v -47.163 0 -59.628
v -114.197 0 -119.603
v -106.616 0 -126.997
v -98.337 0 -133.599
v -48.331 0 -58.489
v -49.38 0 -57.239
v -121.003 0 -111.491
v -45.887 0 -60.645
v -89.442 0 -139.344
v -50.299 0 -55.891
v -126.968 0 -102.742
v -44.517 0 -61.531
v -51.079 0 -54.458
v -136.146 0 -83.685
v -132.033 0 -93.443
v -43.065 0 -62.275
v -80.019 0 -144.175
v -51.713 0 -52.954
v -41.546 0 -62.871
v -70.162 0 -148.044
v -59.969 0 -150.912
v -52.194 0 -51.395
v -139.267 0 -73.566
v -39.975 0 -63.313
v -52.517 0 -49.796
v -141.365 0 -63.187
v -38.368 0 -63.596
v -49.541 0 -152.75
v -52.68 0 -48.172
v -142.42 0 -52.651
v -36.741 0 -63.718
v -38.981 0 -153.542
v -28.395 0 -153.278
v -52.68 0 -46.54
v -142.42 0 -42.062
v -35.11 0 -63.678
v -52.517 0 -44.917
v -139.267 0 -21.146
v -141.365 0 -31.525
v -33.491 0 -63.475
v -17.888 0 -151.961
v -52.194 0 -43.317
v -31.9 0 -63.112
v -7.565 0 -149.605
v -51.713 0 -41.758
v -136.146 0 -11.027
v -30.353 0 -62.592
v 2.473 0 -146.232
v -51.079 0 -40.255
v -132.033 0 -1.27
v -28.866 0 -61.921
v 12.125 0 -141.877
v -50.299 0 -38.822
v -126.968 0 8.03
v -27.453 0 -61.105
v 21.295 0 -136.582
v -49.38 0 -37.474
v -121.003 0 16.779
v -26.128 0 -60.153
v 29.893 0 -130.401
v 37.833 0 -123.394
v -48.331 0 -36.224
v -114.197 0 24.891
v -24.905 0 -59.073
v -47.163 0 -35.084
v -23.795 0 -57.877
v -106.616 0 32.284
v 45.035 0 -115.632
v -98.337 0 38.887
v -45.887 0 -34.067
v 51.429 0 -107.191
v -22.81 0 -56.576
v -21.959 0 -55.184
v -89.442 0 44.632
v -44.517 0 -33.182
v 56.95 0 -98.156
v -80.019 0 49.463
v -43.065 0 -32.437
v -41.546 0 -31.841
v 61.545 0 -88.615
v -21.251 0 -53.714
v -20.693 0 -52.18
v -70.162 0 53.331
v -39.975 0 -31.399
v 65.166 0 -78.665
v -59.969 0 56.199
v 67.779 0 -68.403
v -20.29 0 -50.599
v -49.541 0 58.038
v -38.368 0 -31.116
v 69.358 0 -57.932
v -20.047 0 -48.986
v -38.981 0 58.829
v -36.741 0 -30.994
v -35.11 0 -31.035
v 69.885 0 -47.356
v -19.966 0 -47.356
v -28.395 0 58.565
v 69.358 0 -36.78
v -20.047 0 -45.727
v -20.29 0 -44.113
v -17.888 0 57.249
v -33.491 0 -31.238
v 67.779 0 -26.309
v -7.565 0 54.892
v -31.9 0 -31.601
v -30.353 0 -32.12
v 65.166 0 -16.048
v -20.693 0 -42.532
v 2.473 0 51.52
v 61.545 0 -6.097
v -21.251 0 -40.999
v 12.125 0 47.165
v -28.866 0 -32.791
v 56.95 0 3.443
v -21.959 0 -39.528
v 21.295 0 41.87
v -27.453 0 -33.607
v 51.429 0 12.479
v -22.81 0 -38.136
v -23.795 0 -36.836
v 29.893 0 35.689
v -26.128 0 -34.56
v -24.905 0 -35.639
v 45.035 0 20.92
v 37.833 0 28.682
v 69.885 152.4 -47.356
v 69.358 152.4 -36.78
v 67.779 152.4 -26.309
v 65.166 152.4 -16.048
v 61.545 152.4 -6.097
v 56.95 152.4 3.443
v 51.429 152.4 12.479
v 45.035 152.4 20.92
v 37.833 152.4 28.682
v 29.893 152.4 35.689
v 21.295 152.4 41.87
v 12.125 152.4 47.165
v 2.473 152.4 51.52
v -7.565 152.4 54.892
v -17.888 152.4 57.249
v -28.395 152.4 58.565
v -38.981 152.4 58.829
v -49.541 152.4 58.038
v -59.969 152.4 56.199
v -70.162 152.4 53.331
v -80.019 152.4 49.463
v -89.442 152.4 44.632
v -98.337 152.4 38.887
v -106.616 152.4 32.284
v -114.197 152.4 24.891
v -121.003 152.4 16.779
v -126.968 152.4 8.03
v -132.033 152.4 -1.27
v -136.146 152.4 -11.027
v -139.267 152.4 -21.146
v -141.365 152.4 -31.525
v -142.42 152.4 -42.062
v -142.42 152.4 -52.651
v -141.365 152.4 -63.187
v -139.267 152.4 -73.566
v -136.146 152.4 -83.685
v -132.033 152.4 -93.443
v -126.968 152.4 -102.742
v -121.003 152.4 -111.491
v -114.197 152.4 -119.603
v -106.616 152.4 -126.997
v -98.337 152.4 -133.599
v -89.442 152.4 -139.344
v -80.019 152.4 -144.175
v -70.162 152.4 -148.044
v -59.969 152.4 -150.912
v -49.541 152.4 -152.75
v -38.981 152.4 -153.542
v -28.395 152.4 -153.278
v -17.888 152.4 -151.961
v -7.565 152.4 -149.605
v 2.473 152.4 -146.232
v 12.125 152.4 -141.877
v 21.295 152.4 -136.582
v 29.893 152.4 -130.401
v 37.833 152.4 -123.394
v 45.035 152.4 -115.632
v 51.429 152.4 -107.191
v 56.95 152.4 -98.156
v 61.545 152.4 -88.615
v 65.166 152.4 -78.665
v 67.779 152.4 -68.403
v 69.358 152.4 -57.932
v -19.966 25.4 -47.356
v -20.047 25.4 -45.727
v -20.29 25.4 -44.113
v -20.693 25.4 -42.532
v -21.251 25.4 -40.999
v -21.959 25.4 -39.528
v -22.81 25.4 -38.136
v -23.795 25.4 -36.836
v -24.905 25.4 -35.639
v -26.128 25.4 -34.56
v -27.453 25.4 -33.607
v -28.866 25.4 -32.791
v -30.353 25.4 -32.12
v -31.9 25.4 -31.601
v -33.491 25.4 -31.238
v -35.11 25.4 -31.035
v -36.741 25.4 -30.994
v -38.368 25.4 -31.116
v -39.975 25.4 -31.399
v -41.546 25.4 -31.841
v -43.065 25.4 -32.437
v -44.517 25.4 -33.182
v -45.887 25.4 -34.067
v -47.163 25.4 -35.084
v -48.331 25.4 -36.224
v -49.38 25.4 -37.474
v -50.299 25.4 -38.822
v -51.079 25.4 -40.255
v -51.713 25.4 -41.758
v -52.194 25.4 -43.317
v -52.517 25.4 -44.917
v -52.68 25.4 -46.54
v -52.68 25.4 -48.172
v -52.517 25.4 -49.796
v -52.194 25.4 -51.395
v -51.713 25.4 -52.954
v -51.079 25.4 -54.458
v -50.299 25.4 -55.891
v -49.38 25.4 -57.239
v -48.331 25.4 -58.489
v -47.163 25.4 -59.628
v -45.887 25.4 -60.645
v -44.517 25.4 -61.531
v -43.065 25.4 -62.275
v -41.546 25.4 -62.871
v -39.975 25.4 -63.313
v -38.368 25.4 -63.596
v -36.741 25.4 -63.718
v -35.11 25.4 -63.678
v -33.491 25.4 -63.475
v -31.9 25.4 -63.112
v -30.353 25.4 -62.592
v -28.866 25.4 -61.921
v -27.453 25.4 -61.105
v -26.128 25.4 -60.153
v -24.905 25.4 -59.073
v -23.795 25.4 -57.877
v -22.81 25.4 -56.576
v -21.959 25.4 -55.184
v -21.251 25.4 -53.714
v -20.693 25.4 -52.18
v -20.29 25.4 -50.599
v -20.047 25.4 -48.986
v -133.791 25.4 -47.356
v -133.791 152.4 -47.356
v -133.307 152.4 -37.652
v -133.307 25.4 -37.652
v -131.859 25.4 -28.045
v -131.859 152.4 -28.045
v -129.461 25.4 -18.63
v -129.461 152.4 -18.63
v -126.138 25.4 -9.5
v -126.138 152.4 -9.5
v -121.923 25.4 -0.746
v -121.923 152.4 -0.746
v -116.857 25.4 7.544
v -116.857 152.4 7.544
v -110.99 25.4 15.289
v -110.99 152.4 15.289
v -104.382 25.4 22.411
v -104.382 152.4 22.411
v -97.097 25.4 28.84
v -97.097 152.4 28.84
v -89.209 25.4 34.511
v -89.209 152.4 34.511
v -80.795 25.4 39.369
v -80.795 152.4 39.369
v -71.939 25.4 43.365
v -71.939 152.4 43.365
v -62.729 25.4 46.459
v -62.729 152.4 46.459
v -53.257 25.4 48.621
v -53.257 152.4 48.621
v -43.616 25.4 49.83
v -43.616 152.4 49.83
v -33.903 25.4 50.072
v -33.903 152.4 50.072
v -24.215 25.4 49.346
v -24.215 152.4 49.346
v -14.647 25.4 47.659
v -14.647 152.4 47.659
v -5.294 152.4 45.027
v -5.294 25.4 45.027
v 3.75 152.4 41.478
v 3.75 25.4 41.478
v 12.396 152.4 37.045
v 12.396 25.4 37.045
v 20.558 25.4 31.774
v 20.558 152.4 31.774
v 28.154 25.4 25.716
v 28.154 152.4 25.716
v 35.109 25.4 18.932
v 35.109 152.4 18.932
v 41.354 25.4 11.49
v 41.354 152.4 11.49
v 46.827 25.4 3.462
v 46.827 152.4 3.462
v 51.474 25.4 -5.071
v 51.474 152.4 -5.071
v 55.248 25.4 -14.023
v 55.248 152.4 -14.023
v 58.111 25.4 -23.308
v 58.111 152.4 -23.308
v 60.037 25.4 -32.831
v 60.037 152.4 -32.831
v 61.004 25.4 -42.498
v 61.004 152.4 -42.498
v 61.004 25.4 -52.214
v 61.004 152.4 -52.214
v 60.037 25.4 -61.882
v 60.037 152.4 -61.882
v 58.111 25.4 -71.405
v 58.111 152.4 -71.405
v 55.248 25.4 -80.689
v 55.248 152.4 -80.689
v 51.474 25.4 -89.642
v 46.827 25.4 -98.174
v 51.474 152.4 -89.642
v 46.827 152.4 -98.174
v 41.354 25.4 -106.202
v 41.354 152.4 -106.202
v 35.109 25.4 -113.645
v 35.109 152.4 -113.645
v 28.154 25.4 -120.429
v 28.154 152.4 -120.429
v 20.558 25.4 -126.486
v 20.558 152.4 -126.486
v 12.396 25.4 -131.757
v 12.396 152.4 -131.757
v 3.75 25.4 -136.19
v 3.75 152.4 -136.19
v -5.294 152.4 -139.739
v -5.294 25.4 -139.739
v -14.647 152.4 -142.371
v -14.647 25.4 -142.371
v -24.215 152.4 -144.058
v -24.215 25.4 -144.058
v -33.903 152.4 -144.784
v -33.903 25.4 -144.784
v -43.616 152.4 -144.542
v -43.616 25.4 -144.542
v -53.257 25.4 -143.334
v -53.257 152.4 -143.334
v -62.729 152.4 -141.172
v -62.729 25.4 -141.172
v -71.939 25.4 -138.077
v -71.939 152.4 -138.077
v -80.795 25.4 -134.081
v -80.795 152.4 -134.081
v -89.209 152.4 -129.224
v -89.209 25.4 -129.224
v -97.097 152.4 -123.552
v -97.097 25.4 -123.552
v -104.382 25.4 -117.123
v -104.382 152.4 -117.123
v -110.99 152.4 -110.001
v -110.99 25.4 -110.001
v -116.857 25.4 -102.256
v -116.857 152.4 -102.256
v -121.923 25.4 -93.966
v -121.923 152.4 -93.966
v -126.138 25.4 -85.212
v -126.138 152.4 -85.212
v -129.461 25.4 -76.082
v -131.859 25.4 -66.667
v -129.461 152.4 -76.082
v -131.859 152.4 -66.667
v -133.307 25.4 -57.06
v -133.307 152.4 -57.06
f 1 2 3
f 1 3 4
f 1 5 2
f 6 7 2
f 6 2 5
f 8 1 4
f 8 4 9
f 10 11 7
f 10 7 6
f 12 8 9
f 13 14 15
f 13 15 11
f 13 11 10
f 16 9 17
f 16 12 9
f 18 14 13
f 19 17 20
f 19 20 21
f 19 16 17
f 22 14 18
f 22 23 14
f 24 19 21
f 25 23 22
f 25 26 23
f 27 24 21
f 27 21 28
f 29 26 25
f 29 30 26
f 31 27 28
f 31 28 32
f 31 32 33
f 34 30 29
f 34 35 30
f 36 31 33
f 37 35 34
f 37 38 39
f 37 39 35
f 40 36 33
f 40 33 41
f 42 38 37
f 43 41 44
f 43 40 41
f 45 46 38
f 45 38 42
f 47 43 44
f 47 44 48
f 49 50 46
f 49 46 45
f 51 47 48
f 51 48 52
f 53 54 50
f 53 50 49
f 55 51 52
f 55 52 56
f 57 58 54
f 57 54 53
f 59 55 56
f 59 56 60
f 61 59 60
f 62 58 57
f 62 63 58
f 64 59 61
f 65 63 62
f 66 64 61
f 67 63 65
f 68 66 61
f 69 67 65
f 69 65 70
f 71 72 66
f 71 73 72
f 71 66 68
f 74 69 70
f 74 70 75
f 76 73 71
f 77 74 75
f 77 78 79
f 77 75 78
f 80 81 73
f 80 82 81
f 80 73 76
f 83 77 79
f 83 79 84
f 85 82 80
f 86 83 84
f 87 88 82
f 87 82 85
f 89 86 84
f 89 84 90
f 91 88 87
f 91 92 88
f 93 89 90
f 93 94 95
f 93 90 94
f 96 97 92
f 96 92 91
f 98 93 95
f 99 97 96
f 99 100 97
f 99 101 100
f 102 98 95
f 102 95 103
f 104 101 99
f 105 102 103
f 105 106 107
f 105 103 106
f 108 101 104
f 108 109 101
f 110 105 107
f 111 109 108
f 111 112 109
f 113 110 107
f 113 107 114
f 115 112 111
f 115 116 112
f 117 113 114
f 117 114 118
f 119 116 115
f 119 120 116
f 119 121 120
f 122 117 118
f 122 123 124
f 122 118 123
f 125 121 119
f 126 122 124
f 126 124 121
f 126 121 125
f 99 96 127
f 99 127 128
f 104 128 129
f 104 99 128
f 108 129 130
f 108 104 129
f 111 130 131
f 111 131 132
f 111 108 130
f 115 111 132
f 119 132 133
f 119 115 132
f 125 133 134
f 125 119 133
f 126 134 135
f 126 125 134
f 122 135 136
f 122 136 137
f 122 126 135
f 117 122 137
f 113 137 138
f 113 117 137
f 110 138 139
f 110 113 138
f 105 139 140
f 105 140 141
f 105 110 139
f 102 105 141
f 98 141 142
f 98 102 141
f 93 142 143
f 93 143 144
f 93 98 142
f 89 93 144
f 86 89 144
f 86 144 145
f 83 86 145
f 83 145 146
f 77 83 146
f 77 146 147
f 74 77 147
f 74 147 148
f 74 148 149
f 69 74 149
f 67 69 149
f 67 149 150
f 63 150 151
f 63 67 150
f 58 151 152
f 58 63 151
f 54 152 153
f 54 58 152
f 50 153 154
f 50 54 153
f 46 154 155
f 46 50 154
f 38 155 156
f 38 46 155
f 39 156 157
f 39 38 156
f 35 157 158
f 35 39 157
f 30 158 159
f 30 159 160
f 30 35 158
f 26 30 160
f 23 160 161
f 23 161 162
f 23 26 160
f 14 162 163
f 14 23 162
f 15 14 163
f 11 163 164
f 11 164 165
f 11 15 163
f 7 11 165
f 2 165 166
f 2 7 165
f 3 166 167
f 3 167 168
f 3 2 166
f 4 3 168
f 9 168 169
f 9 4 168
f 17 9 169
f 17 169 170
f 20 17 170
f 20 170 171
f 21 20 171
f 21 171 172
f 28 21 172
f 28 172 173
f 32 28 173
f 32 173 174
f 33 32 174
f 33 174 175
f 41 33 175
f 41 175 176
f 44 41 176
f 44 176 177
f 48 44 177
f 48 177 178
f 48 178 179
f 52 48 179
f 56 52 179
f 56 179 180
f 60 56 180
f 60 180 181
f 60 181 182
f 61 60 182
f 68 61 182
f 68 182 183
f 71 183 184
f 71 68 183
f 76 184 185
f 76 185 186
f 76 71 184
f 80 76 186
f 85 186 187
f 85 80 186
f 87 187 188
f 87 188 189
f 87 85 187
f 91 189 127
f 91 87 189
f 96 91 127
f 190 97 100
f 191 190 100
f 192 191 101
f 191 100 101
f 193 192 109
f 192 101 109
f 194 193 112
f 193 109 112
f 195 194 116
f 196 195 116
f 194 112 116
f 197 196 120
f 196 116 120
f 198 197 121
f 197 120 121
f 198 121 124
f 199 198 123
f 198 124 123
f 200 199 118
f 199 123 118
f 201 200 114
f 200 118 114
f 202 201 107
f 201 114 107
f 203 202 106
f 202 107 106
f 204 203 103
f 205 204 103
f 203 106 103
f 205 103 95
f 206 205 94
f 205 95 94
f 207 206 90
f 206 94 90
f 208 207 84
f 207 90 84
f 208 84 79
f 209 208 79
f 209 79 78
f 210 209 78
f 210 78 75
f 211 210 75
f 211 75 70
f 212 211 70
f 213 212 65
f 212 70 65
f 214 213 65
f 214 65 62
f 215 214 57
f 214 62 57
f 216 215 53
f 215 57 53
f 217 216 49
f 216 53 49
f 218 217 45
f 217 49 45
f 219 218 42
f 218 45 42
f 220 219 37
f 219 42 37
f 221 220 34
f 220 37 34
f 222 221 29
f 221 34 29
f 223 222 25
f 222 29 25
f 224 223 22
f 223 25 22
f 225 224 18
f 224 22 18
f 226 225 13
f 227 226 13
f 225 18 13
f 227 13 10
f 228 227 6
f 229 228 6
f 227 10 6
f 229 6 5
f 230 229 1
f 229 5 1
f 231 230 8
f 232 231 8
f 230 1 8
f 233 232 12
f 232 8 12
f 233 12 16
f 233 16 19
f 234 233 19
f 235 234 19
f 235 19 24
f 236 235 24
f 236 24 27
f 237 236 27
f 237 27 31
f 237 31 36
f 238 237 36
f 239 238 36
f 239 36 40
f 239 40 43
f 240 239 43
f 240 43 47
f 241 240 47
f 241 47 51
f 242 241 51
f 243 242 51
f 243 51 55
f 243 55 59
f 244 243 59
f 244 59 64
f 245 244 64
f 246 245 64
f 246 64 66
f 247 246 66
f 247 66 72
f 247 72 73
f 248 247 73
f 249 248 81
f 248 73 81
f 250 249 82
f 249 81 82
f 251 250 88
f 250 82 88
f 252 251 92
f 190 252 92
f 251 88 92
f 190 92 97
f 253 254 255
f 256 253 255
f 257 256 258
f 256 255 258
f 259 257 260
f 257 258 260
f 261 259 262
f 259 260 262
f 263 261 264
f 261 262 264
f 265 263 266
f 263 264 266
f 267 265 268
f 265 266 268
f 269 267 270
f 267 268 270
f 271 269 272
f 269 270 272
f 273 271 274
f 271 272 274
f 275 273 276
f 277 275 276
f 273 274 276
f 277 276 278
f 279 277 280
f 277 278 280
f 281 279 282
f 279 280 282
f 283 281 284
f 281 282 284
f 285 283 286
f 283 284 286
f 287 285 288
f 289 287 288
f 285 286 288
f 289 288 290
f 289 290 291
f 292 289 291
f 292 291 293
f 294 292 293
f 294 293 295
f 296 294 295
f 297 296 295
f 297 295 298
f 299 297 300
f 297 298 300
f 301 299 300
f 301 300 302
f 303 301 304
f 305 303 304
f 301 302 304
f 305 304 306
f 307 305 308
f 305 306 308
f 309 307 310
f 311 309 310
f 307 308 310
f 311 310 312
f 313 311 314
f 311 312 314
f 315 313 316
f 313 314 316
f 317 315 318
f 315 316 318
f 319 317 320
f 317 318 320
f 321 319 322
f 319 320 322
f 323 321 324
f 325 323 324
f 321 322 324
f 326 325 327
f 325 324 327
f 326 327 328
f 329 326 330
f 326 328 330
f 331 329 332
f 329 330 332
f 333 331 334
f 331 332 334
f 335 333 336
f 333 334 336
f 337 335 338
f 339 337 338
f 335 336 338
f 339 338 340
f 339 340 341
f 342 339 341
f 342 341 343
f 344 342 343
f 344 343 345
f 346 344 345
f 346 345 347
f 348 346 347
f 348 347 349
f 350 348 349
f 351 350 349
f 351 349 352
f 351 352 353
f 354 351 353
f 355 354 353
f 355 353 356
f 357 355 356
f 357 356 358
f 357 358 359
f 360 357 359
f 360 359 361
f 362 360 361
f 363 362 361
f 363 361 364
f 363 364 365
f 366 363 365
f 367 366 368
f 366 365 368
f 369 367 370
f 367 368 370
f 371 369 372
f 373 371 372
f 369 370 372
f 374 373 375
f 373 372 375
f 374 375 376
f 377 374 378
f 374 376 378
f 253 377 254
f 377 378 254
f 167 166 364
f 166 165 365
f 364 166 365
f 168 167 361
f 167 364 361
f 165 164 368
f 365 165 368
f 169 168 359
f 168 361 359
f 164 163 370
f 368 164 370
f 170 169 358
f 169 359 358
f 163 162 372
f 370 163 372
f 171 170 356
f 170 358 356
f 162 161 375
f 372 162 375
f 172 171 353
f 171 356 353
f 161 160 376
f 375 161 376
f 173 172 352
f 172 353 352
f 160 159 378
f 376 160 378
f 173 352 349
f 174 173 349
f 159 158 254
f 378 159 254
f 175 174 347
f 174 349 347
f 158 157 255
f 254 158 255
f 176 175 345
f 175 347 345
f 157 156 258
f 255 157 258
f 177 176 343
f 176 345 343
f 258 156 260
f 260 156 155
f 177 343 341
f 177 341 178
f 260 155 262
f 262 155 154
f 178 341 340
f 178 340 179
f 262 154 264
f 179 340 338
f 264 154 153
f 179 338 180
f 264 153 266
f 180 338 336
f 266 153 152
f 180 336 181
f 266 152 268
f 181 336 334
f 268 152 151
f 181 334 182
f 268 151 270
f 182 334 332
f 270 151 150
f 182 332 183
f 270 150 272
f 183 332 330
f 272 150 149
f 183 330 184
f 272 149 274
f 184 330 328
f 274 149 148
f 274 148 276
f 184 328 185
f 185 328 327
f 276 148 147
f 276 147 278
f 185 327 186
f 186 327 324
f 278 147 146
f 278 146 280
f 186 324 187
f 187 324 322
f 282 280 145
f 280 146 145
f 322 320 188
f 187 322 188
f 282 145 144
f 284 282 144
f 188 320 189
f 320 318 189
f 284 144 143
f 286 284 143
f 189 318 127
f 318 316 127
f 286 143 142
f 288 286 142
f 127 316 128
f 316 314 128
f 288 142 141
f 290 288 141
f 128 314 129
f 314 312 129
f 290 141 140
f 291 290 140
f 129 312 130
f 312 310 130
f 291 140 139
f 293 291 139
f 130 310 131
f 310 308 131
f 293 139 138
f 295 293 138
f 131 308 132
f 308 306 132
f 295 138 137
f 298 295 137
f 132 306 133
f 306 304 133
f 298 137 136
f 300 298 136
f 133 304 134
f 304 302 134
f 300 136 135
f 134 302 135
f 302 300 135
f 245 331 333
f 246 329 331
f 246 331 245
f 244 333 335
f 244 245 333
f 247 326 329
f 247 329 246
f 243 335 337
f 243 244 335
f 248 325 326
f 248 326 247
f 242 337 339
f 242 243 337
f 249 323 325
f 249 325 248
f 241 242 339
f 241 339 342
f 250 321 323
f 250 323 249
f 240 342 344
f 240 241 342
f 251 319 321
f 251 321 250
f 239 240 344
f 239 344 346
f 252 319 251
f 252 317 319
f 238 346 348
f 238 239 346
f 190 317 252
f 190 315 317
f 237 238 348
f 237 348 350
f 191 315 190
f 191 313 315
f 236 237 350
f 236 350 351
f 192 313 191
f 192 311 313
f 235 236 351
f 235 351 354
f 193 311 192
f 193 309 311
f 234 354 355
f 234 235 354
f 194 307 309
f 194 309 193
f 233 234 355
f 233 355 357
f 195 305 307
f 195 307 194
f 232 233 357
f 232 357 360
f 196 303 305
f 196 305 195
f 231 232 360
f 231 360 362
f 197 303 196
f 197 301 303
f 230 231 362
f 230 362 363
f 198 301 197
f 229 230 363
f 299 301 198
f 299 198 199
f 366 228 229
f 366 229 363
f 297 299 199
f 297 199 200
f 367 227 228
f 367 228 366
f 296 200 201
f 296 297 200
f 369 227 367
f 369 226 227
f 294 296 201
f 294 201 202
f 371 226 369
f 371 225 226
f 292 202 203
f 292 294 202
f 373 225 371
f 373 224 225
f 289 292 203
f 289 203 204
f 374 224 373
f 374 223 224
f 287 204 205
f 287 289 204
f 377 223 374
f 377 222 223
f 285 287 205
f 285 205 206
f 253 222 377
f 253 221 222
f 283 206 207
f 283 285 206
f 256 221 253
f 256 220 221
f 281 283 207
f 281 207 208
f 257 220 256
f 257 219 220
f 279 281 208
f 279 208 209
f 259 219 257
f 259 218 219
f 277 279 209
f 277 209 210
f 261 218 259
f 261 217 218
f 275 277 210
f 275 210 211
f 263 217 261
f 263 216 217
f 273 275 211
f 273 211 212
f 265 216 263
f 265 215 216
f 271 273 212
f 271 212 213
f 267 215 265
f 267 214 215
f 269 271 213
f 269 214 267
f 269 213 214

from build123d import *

# Parameters (mm, degrees)
F0_R     = 106.21854
F1_DEPTH = 152.4
F2_R     = 101.492892
F3_DEPTH = 127
F4_R     = 97.458229
F5_DEPTH = 127
F6_R     = 16.367238
F7_DEPTH = 25.4


with BuildPart() as f1:
    # F0 (on Front) → F1 (new body)
    with BuildSketch(Plane.XZ):
        with Locations((-36.333058, -47.356166)):
            Circle(F0_R)
    extrude(amount=-F1_DEPTH)

    # F2 (on face) → F3 (join)
    with BuildSketch(Plane.XZ):
        with Locations((-36.333058, -47.356166)):
            Circle(F2_R)
    extrude(amount=-F3_DEPTH)

    # F4 (on face) → F5 (cut)
    with BuildSketch(Plane(origin=(0, 152.4, 0), x_dir=(-1, 0, 0), z_dir=(0, 1, 0))):
        with Locations((36.333058, -47.356166)):
            Circle(F4_R)
    extrude(amount=-F5_DEPTH, mode=Mode.SUBTRACT)

    # F6 (on face) → F7 (cut)
    with BuildSketch(Plane.XZ):
        with Locations((-36.333058, -47.356166)):
            Circle(F6_R)
    extrude(amount=-F7_DEPTH, mode=Mode.SUBTRACT)


solid = f1.part
